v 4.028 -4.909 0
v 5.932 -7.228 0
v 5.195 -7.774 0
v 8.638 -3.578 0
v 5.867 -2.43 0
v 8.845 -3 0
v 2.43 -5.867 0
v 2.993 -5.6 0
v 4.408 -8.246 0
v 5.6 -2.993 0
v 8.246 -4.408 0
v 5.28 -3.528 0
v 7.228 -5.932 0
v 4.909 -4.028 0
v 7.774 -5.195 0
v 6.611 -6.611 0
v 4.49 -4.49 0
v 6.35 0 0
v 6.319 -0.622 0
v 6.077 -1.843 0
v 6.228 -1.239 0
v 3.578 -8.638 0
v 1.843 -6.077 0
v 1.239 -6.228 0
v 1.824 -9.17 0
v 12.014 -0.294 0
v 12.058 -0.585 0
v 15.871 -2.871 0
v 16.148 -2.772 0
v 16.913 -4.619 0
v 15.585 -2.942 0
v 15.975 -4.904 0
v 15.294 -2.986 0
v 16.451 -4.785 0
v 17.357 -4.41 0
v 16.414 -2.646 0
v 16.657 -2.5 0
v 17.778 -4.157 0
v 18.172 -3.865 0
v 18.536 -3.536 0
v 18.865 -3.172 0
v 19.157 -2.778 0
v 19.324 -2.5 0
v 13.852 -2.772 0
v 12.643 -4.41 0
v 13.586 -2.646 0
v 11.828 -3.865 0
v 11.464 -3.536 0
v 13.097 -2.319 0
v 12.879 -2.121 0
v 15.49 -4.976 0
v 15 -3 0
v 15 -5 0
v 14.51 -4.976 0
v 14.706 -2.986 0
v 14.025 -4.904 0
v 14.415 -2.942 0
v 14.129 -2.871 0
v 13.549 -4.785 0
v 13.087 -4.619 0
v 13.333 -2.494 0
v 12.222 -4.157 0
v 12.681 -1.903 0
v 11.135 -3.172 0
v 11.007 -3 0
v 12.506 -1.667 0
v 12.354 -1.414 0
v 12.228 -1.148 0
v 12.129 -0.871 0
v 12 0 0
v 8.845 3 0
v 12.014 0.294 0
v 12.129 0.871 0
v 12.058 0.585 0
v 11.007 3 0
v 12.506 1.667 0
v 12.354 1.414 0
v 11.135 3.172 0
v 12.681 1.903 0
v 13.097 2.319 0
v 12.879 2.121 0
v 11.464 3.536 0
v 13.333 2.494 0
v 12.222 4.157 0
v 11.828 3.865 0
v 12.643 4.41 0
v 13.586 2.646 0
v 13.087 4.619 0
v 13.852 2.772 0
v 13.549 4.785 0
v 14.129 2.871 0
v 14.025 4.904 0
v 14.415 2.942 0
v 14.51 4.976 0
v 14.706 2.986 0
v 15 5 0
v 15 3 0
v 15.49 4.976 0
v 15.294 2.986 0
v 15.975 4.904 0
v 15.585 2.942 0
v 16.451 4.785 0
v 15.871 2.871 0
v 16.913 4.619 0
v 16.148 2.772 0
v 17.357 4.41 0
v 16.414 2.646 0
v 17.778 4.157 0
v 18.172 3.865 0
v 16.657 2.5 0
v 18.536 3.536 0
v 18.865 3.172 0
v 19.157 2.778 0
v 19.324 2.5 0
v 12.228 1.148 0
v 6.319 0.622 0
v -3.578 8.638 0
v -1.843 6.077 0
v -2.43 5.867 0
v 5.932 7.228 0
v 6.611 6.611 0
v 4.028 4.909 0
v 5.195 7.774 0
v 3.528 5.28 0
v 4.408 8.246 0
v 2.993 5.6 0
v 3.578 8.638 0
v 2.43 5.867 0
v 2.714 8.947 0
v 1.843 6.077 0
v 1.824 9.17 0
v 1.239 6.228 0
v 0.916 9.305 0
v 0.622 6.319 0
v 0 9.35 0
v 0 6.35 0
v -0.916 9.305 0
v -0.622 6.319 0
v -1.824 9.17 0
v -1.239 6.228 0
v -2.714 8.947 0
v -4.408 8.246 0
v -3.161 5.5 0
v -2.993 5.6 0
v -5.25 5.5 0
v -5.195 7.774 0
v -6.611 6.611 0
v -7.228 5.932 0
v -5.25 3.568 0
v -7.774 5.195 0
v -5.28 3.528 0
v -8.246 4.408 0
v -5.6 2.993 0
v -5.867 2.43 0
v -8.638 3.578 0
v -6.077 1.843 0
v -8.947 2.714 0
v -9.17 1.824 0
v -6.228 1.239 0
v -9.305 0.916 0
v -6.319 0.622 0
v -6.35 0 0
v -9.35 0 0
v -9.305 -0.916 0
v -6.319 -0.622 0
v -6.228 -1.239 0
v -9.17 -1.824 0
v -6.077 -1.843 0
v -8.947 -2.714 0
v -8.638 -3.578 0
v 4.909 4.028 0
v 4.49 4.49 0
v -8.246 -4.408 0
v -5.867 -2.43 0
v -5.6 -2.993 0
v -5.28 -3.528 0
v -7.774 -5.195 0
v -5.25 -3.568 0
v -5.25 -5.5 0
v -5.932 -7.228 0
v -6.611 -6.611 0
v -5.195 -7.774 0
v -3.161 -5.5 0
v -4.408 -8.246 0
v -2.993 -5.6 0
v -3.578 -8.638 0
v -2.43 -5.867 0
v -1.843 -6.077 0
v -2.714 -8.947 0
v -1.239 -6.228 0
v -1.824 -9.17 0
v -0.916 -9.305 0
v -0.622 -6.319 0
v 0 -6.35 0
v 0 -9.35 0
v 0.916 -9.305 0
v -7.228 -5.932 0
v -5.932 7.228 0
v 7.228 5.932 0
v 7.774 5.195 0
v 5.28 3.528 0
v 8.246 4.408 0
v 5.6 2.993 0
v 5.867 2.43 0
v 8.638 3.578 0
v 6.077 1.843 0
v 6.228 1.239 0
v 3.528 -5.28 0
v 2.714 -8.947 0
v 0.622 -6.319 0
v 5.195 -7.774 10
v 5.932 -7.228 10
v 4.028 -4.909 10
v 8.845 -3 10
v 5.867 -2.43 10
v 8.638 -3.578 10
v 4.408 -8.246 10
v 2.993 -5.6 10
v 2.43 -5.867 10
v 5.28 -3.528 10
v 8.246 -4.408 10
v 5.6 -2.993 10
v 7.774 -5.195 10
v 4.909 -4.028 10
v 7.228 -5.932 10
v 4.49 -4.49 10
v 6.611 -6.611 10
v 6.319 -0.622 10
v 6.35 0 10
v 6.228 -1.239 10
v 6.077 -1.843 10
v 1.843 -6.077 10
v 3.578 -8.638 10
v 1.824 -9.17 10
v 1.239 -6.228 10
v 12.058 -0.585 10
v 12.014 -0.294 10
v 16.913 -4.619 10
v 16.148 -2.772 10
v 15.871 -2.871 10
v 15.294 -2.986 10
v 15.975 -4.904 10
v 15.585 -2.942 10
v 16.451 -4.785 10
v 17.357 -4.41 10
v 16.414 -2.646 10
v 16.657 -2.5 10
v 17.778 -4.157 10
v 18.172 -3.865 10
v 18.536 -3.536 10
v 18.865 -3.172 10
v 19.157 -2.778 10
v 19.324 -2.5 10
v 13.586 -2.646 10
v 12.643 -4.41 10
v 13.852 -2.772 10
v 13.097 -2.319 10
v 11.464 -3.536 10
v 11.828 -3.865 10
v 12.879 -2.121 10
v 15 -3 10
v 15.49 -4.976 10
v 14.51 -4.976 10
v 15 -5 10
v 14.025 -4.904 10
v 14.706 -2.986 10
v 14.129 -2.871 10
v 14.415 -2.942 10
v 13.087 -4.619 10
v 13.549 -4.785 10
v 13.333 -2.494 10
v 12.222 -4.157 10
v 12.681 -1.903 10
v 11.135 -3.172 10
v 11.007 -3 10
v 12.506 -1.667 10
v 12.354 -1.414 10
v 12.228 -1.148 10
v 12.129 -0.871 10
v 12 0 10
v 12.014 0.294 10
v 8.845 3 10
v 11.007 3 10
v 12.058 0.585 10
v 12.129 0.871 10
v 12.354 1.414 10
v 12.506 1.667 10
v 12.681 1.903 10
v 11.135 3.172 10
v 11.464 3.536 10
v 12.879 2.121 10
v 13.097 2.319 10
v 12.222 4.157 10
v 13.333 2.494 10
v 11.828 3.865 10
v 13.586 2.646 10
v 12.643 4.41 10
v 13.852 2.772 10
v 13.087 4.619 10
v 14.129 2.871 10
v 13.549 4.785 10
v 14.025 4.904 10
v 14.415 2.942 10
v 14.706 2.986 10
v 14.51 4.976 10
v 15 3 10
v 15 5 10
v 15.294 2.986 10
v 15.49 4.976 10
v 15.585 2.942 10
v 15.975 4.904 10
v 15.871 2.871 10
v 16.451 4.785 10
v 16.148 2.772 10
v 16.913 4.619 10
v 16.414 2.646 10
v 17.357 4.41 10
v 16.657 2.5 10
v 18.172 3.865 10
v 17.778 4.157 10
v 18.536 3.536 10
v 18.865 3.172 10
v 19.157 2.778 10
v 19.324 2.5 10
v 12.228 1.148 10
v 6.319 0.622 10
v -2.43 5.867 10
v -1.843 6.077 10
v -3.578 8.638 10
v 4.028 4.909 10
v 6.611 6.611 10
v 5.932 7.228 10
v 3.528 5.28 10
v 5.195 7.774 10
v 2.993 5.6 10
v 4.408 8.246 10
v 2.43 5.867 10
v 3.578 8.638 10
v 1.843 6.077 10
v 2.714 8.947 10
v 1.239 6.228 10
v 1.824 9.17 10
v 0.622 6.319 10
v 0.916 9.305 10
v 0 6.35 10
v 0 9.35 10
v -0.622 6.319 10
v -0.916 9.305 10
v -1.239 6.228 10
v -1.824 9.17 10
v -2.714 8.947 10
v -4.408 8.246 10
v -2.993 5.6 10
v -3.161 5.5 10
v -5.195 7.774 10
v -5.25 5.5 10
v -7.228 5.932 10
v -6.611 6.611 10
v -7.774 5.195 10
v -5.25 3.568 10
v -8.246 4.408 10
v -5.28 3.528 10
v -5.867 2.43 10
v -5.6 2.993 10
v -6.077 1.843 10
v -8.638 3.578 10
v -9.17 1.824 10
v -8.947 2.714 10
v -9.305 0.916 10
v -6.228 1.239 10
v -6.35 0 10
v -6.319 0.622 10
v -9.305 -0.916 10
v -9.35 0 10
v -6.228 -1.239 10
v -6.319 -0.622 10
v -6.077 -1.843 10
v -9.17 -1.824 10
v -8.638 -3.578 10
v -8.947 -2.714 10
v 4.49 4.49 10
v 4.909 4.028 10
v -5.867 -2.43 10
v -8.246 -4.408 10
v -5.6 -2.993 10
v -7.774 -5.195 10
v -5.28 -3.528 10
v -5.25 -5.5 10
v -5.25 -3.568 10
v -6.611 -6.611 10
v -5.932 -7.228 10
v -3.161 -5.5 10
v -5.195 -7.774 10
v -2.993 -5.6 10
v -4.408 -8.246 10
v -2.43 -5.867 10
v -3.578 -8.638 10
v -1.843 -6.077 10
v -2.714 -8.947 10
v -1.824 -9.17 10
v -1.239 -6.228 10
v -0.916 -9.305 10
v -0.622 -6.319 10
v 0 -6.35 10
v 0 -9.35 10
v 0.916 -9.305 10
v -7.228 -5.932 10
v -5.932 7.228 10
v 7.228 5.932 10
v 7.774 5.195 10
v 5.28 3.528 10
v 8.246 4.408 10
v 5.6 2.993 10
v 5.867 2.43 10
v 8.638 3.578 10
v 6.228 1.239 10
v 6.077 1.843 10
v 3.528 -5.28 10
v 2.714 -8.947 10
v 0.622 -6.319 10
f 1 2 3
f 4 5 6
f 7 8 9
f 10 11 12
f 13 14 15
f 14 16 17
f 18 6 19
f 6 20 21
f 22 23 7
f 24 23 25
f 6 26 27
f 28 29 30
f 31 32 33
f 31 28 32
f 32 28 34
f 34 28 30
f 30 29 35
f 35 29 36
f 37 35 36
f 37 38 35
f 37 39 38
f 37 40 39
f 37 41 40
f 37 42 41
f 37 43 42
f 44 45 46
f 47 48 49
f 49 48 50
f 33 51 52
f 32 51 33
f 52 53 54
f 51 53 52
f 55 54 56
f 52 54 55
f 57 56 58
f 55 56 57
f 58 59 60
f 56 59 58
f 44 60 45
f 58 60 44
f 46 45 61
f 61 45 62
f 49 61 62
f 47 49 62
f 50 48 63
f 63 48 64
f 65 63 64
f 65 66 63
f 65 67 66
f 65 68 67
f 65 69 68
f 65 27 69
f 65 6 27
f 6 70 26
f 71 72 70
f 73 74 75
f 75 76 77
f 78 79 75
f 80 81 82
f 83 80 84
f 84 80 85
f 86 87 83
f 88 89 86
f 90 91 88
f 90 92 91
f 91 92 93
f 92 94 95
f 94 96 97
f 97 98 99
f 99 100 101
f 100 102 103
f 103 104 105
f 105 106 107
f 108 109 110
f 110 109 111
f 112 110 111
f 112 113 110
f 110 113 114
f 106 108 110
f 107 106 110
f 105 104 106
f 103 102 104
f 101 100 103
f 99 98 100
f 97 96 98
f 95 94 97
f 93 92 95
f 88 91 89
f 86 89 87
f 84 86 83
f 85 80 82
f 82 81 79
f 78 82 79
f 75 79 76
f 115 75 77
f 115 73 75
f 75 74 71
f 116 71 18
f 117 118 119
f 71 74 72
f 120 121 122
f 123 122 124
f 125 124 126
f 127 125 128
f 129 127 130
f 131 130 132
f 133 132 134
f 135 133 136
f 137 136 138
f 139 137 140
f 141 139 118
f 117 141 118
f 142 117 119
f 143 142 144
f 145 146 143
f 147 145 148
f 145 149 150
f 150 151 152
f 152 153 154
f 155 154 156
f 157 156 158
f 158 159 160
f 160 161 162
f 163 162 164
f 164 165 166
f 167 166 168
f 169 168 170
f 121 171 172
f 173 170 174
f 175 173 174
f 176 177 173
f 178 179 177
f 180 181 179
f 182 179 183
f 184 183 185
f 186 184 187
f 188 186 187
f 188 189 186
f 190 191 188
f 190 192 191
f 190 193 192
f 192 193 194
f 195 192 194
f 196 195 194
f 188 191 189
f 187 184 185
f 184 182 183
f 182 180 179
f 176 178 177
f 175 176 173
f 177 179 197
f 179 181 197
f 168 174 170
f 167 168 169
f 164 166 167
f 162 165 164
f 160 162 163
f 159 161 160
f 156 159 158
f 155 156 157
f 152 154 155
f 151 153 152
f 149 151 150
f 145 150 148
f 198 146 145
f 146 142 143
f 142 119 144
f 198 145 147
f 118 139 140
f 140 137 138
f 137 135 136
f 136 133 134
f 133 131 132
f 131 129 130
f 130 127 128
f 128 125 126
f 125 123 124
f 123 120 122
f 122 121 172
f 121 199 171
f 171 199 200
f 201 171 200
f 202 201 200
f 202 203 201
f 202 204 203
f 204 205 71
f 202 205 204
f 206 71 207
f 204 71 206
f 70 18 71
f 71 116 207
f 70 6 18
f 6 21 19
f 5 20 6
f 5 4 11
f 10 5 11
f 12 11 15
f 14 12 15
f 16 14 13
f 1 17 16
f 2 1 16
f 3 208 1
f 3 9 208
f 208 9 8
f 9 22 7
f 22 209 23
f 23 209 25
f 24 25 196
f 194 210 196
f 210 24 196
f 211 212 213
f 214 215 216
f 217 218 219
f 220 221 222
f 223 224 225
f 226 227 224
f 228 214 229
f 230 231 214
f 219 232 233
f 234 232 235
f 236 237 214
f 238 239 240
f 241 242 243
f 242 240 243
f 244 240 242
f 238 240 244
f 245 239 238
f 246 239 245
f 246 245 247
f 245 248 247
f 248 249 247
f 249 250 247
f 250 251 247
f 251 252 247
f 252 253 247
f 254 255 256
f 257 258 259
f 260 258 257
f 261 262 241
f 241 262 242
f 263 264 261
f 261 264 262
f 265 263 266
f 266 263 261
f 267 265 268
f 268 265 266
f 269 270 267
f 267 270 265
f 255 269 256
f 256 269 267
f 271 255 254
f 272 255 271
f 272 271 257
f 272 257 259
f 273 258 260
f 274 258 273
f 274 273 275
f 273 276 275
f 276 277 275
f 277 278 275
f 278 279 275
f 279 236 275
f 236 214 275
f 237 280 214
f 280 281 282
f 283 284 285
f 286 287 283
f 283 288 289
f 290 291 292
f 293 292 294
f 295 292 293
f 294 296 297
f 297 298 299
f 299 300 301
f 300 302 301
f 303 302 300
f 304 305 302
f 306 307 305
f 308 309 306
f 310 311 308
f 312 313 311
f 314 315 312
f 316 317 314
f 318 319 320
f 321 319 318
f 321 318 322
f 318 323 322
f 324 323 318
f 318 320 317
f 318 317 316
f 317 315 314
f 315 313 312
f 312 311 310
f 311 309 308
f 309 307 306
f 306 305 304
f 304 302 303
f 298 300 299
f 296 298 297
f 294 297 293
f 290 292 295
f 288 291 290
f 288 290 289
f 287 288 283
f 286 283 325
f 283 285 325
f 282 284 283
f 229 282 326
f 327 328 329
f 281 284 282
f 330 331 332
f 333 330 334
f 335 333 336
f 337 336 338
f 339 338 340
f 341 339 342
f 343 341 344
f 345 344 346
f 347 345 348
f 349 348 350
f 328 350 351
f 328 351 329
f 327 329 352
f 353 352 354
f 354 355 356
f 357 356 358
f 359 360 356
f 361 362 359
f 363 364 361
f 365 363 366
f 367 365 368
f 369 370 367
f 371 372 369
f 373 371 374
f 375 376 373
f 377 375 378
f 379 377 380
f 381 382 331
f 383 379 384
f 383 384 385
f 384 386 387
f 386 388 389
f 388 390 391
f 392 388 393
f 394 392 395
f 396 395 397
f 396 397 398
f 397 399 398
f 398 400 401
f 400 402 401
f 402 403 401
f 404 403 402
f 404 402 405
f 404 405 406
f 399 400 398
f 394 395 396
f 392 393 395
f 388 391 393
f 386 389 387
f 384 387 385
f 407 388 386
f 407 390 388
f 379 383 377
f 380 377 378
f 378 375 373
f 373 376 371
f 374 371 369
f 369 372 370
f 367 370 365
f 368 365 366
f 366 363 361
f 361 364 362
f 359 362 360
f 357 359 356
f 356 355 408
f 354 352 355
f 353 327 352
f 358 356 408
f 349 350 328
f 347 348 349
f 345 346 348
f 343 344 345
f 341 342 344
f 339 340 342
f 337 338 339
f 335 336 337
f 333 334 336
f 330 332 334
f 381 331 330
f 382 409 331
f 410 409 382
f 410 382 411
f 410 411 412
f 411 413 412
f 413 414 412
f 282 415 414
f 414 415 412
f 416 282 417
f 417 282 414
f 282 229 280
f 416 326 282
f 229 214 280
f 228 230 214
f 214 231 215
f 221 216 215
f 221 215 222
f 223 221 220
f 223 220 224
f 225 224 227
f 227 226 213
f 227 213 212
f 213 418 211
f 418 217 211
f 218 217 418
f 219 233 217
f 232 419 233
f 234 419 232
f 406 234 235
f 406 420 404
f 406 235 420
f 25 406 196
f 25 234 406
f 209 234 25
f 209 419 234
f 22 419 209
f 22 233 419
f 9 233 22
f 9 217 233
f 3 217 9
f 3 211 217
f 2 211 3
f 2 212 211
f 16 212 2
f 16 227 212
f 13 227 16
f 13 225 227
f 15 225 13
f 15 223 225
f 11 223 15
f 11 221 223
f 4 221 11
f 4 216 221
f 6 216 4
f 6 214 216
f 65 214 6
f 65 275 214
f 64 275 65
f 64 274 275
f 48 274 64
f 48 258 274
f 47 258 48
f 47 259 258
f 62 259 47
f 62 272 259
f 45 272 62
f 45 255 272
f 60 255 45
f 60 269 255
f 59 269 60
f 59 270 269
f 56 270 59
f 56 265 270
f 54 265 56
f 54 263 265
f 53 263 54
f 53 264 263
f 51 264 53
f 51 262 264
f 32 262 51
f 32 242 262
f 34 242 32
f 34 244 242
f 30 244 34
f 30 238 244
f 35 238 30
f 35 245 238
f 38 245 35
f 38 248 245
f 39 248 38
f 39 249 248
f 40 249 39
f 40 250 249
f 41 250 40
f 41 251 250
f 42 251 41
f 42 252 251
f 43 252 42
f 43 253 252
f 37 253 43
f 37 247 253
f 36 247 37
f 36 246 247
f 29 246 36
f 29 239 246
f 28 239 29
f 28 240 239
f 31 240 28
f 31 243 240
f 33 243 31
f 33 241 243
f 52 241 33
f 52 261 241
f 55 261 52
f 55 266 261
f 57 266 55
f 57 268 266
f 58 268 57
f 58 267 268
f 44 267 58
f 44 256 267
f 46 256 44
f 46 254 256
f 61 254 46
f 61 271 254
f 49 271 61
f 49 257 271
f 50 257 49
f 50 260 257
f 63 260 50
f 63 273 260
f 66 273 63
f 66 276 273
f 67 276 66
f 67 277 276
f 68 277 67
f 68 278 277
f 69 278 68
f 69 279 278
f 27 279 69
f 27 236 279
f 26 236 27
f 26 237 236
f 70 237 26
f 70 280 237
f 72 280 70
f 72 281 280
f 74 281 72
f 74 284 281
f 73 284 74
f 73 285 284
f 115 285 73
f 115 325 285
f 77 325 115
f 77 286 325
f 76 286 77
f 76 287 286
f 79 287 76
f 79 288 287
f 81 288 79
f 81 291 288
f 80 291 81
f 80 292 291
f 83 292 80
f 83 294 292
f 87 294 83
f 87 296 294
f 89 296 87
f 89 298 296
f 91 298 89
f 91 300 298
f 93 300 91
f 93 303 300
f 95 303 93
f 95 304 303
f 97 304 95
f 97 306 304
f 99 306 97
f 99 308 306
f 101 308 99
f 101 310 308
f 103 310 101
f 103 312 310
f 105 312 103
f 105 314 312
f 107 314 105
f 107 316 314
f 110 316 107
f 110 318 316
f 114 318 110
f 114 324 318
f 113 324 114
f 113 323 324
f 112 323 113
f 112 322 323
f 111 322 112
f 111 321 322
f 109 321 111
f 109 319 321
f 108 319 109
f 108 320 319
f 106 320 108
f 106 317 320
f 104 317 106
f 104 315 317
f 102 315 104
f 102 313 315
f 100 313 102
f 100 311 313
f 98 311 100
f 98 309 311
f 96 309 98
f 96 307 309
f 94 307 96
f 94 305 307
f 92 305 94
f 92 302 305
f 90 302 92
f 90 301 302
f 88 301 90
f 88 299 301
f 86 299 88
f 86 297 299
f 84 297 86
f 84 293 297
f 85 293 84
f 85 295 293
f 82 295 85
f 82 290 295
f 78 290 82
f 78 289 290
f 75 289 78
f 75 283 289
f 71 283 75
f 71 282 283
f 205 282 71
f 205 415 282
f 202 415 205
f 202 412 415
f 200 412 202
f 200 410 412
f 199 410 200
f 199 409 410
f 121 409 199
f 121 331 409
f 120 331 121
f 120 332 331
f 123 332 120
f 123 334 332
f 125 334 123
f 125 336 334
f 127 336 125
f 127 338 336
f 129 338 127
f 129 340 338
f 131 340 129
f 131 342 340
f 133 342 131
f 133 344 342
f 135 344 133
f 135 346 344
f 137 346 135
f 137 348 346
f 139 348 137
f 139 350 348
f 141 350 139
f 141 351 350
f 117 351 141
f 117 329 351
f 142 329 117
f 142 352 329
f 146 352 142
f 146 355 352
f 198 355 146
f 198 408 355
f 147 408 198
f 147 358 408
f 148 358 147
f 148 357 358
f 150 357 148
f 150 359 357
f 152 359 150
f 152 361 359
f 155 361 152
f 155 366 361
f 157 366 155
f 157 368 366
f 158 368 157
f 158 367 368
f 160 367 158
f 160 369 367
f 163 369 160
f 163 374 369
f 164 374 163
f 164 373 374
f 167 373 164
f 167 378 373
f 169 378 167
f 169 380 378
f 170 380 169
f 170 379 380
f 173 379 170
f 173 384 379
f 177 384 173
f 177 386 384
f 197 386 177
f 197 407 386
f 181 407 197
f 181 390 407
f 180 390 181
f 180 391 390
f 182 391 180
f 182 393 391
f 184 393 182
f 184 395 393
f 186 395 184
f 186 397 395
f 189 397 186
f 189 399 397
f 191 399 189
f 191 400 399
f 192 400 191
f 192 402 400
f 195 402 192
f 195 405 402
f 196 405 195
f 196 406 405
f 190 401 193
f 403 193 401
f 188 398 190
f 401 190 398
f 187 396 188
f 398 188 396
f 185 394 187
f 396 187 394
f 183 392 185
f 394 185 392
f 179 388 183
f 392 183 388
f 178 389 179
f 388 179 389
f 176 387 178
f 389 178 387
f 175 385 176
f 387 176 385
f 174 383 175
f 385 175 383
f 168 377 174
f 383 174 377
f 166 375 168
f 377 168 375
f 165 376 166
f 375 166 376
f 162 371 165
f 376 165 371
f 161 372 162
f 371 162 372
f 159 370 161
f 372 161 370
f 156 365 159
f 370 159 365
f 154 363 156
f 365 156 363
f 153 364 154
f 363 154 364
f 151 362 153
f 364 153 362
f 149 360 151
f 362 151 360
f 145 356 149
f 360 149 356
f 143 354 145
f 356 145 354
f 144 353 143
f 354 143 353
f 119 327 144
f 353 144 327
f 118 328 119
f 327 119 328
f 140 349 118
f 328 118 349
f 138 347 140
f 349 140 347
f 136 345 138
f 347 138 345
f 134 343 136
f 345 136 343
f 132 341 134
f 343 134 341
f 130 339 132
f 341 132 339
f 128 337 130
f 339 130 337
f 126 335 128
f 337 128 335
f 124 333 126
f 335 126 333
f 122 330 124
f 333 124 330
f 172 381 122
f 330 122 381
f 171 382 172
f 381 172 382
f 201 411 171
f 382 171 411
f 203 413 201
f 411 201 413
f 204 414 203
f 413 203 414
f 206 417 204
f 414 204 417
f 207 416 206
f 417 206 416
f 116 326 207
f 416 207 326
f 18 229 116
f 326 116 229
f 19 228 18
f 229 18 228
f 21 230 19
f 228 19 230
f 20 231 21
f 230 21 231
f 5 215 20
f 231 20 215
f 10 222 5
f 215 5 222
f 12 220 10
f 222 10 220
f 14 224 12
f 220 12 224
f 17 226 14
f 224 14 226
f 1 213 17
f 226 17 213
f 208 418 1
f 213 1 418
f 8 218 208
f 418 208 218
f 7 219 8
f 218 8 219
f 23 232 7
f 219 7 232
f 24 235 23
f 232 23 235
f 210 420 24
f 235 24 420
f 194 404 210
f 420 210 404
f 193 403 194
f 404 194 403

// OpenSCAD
// --- Parameters (Dimensions in mm) ---

// Rod Ring (Inner diameter 12.7mm, Wall 3mm)
rod_inner_dia = 12.7;
rod_wall = 3.0;
rod_outer_dia = rod_inner_dia + (2 * rod_wall);

// Rod Ring Cutout (10mm wide, 10mm tall, centered on -X side)
// Prompt: "everything with x < 0 and -5 < y < 5 is removed"
rod_cutout_width = 5.0; // From x = -5 to x = 0
rod_cutout_height = 10.0;

// Tubing Ring (Inner diameter 6mm, Wall 2mm)
tube_inner_dia = 6.0;
tube_wall = 2.0;
tube_outer_dia = tube_inner_dia + (2 * tube_wall);
tube_offset_x = 15.0;

// Tubing Ring Cutout (4.5mm wide, centered on +X side)
// Prompt: "x > 15 and -2.25 < y < 2.25"
tube_cutout_width = 4.5;
tube_cutout_height = 4.5;

// Bridge (6mm wide in Y, between x=8 and x=12)
bridge_x_start = 8.0;
bridge_x_end = 12.0;
bridge_y_width = 6.0;

// Extrusion Height
extrusion_z = 10.0;

// Resolution
$fn = 64;

// --- Modeling ---

// We define the 2D profile first to avoid mixing 2D and 3D objects.
module profile_2d() {
    difference() {
        union() {
            // 1. Rod Ring Profile
            difference() {
                circle(d = rod_outer_dia);
                circle(d = rod_inner_dia);
            }
            
            // 2. Tubing Ring Profile
            translate([tube_offset_x, 0])
            difference() {
                circle(d = tube_outer_dia);
                circle(d = tube_inner_dia);
            }
            
            // 3. Solid Bridge Profile
            // A rectangle from x=8 to x=12, centered on Y
            translate([(bridge_x_start + bridge_x_end)/2, 0])
                square([bridge_x_end - bridge_x_start, bridge_y_width], center = true);
        }

        // Subtract Rod Cutout: x < 0 and -5 < y < 5
        // We use a rectangle from x = -5 to x = 0.5 (to ensure clean cut)
        // and y = -5.5 to 5.5 (to ensure clean cut)
        translate([-2.5, 0])
            square([5.5, 11.0], center = true);

        // Subtract Tubing Cutout: x > 15 and -2.25 < y < 2.25
        // We use a rectangle from x = 14.5 to x = 20 (to ensure clean cut)
        // and y = -2.5 to 2.5 (to ensure clean cut)
        translate([17.25, 0])
            square([5.5, 5.0], center = true);
    }
}

// Final 3D Object: Extrude the 2D profile
linear_extrude(height = extrusion_z) {
    profile_2d();
}
